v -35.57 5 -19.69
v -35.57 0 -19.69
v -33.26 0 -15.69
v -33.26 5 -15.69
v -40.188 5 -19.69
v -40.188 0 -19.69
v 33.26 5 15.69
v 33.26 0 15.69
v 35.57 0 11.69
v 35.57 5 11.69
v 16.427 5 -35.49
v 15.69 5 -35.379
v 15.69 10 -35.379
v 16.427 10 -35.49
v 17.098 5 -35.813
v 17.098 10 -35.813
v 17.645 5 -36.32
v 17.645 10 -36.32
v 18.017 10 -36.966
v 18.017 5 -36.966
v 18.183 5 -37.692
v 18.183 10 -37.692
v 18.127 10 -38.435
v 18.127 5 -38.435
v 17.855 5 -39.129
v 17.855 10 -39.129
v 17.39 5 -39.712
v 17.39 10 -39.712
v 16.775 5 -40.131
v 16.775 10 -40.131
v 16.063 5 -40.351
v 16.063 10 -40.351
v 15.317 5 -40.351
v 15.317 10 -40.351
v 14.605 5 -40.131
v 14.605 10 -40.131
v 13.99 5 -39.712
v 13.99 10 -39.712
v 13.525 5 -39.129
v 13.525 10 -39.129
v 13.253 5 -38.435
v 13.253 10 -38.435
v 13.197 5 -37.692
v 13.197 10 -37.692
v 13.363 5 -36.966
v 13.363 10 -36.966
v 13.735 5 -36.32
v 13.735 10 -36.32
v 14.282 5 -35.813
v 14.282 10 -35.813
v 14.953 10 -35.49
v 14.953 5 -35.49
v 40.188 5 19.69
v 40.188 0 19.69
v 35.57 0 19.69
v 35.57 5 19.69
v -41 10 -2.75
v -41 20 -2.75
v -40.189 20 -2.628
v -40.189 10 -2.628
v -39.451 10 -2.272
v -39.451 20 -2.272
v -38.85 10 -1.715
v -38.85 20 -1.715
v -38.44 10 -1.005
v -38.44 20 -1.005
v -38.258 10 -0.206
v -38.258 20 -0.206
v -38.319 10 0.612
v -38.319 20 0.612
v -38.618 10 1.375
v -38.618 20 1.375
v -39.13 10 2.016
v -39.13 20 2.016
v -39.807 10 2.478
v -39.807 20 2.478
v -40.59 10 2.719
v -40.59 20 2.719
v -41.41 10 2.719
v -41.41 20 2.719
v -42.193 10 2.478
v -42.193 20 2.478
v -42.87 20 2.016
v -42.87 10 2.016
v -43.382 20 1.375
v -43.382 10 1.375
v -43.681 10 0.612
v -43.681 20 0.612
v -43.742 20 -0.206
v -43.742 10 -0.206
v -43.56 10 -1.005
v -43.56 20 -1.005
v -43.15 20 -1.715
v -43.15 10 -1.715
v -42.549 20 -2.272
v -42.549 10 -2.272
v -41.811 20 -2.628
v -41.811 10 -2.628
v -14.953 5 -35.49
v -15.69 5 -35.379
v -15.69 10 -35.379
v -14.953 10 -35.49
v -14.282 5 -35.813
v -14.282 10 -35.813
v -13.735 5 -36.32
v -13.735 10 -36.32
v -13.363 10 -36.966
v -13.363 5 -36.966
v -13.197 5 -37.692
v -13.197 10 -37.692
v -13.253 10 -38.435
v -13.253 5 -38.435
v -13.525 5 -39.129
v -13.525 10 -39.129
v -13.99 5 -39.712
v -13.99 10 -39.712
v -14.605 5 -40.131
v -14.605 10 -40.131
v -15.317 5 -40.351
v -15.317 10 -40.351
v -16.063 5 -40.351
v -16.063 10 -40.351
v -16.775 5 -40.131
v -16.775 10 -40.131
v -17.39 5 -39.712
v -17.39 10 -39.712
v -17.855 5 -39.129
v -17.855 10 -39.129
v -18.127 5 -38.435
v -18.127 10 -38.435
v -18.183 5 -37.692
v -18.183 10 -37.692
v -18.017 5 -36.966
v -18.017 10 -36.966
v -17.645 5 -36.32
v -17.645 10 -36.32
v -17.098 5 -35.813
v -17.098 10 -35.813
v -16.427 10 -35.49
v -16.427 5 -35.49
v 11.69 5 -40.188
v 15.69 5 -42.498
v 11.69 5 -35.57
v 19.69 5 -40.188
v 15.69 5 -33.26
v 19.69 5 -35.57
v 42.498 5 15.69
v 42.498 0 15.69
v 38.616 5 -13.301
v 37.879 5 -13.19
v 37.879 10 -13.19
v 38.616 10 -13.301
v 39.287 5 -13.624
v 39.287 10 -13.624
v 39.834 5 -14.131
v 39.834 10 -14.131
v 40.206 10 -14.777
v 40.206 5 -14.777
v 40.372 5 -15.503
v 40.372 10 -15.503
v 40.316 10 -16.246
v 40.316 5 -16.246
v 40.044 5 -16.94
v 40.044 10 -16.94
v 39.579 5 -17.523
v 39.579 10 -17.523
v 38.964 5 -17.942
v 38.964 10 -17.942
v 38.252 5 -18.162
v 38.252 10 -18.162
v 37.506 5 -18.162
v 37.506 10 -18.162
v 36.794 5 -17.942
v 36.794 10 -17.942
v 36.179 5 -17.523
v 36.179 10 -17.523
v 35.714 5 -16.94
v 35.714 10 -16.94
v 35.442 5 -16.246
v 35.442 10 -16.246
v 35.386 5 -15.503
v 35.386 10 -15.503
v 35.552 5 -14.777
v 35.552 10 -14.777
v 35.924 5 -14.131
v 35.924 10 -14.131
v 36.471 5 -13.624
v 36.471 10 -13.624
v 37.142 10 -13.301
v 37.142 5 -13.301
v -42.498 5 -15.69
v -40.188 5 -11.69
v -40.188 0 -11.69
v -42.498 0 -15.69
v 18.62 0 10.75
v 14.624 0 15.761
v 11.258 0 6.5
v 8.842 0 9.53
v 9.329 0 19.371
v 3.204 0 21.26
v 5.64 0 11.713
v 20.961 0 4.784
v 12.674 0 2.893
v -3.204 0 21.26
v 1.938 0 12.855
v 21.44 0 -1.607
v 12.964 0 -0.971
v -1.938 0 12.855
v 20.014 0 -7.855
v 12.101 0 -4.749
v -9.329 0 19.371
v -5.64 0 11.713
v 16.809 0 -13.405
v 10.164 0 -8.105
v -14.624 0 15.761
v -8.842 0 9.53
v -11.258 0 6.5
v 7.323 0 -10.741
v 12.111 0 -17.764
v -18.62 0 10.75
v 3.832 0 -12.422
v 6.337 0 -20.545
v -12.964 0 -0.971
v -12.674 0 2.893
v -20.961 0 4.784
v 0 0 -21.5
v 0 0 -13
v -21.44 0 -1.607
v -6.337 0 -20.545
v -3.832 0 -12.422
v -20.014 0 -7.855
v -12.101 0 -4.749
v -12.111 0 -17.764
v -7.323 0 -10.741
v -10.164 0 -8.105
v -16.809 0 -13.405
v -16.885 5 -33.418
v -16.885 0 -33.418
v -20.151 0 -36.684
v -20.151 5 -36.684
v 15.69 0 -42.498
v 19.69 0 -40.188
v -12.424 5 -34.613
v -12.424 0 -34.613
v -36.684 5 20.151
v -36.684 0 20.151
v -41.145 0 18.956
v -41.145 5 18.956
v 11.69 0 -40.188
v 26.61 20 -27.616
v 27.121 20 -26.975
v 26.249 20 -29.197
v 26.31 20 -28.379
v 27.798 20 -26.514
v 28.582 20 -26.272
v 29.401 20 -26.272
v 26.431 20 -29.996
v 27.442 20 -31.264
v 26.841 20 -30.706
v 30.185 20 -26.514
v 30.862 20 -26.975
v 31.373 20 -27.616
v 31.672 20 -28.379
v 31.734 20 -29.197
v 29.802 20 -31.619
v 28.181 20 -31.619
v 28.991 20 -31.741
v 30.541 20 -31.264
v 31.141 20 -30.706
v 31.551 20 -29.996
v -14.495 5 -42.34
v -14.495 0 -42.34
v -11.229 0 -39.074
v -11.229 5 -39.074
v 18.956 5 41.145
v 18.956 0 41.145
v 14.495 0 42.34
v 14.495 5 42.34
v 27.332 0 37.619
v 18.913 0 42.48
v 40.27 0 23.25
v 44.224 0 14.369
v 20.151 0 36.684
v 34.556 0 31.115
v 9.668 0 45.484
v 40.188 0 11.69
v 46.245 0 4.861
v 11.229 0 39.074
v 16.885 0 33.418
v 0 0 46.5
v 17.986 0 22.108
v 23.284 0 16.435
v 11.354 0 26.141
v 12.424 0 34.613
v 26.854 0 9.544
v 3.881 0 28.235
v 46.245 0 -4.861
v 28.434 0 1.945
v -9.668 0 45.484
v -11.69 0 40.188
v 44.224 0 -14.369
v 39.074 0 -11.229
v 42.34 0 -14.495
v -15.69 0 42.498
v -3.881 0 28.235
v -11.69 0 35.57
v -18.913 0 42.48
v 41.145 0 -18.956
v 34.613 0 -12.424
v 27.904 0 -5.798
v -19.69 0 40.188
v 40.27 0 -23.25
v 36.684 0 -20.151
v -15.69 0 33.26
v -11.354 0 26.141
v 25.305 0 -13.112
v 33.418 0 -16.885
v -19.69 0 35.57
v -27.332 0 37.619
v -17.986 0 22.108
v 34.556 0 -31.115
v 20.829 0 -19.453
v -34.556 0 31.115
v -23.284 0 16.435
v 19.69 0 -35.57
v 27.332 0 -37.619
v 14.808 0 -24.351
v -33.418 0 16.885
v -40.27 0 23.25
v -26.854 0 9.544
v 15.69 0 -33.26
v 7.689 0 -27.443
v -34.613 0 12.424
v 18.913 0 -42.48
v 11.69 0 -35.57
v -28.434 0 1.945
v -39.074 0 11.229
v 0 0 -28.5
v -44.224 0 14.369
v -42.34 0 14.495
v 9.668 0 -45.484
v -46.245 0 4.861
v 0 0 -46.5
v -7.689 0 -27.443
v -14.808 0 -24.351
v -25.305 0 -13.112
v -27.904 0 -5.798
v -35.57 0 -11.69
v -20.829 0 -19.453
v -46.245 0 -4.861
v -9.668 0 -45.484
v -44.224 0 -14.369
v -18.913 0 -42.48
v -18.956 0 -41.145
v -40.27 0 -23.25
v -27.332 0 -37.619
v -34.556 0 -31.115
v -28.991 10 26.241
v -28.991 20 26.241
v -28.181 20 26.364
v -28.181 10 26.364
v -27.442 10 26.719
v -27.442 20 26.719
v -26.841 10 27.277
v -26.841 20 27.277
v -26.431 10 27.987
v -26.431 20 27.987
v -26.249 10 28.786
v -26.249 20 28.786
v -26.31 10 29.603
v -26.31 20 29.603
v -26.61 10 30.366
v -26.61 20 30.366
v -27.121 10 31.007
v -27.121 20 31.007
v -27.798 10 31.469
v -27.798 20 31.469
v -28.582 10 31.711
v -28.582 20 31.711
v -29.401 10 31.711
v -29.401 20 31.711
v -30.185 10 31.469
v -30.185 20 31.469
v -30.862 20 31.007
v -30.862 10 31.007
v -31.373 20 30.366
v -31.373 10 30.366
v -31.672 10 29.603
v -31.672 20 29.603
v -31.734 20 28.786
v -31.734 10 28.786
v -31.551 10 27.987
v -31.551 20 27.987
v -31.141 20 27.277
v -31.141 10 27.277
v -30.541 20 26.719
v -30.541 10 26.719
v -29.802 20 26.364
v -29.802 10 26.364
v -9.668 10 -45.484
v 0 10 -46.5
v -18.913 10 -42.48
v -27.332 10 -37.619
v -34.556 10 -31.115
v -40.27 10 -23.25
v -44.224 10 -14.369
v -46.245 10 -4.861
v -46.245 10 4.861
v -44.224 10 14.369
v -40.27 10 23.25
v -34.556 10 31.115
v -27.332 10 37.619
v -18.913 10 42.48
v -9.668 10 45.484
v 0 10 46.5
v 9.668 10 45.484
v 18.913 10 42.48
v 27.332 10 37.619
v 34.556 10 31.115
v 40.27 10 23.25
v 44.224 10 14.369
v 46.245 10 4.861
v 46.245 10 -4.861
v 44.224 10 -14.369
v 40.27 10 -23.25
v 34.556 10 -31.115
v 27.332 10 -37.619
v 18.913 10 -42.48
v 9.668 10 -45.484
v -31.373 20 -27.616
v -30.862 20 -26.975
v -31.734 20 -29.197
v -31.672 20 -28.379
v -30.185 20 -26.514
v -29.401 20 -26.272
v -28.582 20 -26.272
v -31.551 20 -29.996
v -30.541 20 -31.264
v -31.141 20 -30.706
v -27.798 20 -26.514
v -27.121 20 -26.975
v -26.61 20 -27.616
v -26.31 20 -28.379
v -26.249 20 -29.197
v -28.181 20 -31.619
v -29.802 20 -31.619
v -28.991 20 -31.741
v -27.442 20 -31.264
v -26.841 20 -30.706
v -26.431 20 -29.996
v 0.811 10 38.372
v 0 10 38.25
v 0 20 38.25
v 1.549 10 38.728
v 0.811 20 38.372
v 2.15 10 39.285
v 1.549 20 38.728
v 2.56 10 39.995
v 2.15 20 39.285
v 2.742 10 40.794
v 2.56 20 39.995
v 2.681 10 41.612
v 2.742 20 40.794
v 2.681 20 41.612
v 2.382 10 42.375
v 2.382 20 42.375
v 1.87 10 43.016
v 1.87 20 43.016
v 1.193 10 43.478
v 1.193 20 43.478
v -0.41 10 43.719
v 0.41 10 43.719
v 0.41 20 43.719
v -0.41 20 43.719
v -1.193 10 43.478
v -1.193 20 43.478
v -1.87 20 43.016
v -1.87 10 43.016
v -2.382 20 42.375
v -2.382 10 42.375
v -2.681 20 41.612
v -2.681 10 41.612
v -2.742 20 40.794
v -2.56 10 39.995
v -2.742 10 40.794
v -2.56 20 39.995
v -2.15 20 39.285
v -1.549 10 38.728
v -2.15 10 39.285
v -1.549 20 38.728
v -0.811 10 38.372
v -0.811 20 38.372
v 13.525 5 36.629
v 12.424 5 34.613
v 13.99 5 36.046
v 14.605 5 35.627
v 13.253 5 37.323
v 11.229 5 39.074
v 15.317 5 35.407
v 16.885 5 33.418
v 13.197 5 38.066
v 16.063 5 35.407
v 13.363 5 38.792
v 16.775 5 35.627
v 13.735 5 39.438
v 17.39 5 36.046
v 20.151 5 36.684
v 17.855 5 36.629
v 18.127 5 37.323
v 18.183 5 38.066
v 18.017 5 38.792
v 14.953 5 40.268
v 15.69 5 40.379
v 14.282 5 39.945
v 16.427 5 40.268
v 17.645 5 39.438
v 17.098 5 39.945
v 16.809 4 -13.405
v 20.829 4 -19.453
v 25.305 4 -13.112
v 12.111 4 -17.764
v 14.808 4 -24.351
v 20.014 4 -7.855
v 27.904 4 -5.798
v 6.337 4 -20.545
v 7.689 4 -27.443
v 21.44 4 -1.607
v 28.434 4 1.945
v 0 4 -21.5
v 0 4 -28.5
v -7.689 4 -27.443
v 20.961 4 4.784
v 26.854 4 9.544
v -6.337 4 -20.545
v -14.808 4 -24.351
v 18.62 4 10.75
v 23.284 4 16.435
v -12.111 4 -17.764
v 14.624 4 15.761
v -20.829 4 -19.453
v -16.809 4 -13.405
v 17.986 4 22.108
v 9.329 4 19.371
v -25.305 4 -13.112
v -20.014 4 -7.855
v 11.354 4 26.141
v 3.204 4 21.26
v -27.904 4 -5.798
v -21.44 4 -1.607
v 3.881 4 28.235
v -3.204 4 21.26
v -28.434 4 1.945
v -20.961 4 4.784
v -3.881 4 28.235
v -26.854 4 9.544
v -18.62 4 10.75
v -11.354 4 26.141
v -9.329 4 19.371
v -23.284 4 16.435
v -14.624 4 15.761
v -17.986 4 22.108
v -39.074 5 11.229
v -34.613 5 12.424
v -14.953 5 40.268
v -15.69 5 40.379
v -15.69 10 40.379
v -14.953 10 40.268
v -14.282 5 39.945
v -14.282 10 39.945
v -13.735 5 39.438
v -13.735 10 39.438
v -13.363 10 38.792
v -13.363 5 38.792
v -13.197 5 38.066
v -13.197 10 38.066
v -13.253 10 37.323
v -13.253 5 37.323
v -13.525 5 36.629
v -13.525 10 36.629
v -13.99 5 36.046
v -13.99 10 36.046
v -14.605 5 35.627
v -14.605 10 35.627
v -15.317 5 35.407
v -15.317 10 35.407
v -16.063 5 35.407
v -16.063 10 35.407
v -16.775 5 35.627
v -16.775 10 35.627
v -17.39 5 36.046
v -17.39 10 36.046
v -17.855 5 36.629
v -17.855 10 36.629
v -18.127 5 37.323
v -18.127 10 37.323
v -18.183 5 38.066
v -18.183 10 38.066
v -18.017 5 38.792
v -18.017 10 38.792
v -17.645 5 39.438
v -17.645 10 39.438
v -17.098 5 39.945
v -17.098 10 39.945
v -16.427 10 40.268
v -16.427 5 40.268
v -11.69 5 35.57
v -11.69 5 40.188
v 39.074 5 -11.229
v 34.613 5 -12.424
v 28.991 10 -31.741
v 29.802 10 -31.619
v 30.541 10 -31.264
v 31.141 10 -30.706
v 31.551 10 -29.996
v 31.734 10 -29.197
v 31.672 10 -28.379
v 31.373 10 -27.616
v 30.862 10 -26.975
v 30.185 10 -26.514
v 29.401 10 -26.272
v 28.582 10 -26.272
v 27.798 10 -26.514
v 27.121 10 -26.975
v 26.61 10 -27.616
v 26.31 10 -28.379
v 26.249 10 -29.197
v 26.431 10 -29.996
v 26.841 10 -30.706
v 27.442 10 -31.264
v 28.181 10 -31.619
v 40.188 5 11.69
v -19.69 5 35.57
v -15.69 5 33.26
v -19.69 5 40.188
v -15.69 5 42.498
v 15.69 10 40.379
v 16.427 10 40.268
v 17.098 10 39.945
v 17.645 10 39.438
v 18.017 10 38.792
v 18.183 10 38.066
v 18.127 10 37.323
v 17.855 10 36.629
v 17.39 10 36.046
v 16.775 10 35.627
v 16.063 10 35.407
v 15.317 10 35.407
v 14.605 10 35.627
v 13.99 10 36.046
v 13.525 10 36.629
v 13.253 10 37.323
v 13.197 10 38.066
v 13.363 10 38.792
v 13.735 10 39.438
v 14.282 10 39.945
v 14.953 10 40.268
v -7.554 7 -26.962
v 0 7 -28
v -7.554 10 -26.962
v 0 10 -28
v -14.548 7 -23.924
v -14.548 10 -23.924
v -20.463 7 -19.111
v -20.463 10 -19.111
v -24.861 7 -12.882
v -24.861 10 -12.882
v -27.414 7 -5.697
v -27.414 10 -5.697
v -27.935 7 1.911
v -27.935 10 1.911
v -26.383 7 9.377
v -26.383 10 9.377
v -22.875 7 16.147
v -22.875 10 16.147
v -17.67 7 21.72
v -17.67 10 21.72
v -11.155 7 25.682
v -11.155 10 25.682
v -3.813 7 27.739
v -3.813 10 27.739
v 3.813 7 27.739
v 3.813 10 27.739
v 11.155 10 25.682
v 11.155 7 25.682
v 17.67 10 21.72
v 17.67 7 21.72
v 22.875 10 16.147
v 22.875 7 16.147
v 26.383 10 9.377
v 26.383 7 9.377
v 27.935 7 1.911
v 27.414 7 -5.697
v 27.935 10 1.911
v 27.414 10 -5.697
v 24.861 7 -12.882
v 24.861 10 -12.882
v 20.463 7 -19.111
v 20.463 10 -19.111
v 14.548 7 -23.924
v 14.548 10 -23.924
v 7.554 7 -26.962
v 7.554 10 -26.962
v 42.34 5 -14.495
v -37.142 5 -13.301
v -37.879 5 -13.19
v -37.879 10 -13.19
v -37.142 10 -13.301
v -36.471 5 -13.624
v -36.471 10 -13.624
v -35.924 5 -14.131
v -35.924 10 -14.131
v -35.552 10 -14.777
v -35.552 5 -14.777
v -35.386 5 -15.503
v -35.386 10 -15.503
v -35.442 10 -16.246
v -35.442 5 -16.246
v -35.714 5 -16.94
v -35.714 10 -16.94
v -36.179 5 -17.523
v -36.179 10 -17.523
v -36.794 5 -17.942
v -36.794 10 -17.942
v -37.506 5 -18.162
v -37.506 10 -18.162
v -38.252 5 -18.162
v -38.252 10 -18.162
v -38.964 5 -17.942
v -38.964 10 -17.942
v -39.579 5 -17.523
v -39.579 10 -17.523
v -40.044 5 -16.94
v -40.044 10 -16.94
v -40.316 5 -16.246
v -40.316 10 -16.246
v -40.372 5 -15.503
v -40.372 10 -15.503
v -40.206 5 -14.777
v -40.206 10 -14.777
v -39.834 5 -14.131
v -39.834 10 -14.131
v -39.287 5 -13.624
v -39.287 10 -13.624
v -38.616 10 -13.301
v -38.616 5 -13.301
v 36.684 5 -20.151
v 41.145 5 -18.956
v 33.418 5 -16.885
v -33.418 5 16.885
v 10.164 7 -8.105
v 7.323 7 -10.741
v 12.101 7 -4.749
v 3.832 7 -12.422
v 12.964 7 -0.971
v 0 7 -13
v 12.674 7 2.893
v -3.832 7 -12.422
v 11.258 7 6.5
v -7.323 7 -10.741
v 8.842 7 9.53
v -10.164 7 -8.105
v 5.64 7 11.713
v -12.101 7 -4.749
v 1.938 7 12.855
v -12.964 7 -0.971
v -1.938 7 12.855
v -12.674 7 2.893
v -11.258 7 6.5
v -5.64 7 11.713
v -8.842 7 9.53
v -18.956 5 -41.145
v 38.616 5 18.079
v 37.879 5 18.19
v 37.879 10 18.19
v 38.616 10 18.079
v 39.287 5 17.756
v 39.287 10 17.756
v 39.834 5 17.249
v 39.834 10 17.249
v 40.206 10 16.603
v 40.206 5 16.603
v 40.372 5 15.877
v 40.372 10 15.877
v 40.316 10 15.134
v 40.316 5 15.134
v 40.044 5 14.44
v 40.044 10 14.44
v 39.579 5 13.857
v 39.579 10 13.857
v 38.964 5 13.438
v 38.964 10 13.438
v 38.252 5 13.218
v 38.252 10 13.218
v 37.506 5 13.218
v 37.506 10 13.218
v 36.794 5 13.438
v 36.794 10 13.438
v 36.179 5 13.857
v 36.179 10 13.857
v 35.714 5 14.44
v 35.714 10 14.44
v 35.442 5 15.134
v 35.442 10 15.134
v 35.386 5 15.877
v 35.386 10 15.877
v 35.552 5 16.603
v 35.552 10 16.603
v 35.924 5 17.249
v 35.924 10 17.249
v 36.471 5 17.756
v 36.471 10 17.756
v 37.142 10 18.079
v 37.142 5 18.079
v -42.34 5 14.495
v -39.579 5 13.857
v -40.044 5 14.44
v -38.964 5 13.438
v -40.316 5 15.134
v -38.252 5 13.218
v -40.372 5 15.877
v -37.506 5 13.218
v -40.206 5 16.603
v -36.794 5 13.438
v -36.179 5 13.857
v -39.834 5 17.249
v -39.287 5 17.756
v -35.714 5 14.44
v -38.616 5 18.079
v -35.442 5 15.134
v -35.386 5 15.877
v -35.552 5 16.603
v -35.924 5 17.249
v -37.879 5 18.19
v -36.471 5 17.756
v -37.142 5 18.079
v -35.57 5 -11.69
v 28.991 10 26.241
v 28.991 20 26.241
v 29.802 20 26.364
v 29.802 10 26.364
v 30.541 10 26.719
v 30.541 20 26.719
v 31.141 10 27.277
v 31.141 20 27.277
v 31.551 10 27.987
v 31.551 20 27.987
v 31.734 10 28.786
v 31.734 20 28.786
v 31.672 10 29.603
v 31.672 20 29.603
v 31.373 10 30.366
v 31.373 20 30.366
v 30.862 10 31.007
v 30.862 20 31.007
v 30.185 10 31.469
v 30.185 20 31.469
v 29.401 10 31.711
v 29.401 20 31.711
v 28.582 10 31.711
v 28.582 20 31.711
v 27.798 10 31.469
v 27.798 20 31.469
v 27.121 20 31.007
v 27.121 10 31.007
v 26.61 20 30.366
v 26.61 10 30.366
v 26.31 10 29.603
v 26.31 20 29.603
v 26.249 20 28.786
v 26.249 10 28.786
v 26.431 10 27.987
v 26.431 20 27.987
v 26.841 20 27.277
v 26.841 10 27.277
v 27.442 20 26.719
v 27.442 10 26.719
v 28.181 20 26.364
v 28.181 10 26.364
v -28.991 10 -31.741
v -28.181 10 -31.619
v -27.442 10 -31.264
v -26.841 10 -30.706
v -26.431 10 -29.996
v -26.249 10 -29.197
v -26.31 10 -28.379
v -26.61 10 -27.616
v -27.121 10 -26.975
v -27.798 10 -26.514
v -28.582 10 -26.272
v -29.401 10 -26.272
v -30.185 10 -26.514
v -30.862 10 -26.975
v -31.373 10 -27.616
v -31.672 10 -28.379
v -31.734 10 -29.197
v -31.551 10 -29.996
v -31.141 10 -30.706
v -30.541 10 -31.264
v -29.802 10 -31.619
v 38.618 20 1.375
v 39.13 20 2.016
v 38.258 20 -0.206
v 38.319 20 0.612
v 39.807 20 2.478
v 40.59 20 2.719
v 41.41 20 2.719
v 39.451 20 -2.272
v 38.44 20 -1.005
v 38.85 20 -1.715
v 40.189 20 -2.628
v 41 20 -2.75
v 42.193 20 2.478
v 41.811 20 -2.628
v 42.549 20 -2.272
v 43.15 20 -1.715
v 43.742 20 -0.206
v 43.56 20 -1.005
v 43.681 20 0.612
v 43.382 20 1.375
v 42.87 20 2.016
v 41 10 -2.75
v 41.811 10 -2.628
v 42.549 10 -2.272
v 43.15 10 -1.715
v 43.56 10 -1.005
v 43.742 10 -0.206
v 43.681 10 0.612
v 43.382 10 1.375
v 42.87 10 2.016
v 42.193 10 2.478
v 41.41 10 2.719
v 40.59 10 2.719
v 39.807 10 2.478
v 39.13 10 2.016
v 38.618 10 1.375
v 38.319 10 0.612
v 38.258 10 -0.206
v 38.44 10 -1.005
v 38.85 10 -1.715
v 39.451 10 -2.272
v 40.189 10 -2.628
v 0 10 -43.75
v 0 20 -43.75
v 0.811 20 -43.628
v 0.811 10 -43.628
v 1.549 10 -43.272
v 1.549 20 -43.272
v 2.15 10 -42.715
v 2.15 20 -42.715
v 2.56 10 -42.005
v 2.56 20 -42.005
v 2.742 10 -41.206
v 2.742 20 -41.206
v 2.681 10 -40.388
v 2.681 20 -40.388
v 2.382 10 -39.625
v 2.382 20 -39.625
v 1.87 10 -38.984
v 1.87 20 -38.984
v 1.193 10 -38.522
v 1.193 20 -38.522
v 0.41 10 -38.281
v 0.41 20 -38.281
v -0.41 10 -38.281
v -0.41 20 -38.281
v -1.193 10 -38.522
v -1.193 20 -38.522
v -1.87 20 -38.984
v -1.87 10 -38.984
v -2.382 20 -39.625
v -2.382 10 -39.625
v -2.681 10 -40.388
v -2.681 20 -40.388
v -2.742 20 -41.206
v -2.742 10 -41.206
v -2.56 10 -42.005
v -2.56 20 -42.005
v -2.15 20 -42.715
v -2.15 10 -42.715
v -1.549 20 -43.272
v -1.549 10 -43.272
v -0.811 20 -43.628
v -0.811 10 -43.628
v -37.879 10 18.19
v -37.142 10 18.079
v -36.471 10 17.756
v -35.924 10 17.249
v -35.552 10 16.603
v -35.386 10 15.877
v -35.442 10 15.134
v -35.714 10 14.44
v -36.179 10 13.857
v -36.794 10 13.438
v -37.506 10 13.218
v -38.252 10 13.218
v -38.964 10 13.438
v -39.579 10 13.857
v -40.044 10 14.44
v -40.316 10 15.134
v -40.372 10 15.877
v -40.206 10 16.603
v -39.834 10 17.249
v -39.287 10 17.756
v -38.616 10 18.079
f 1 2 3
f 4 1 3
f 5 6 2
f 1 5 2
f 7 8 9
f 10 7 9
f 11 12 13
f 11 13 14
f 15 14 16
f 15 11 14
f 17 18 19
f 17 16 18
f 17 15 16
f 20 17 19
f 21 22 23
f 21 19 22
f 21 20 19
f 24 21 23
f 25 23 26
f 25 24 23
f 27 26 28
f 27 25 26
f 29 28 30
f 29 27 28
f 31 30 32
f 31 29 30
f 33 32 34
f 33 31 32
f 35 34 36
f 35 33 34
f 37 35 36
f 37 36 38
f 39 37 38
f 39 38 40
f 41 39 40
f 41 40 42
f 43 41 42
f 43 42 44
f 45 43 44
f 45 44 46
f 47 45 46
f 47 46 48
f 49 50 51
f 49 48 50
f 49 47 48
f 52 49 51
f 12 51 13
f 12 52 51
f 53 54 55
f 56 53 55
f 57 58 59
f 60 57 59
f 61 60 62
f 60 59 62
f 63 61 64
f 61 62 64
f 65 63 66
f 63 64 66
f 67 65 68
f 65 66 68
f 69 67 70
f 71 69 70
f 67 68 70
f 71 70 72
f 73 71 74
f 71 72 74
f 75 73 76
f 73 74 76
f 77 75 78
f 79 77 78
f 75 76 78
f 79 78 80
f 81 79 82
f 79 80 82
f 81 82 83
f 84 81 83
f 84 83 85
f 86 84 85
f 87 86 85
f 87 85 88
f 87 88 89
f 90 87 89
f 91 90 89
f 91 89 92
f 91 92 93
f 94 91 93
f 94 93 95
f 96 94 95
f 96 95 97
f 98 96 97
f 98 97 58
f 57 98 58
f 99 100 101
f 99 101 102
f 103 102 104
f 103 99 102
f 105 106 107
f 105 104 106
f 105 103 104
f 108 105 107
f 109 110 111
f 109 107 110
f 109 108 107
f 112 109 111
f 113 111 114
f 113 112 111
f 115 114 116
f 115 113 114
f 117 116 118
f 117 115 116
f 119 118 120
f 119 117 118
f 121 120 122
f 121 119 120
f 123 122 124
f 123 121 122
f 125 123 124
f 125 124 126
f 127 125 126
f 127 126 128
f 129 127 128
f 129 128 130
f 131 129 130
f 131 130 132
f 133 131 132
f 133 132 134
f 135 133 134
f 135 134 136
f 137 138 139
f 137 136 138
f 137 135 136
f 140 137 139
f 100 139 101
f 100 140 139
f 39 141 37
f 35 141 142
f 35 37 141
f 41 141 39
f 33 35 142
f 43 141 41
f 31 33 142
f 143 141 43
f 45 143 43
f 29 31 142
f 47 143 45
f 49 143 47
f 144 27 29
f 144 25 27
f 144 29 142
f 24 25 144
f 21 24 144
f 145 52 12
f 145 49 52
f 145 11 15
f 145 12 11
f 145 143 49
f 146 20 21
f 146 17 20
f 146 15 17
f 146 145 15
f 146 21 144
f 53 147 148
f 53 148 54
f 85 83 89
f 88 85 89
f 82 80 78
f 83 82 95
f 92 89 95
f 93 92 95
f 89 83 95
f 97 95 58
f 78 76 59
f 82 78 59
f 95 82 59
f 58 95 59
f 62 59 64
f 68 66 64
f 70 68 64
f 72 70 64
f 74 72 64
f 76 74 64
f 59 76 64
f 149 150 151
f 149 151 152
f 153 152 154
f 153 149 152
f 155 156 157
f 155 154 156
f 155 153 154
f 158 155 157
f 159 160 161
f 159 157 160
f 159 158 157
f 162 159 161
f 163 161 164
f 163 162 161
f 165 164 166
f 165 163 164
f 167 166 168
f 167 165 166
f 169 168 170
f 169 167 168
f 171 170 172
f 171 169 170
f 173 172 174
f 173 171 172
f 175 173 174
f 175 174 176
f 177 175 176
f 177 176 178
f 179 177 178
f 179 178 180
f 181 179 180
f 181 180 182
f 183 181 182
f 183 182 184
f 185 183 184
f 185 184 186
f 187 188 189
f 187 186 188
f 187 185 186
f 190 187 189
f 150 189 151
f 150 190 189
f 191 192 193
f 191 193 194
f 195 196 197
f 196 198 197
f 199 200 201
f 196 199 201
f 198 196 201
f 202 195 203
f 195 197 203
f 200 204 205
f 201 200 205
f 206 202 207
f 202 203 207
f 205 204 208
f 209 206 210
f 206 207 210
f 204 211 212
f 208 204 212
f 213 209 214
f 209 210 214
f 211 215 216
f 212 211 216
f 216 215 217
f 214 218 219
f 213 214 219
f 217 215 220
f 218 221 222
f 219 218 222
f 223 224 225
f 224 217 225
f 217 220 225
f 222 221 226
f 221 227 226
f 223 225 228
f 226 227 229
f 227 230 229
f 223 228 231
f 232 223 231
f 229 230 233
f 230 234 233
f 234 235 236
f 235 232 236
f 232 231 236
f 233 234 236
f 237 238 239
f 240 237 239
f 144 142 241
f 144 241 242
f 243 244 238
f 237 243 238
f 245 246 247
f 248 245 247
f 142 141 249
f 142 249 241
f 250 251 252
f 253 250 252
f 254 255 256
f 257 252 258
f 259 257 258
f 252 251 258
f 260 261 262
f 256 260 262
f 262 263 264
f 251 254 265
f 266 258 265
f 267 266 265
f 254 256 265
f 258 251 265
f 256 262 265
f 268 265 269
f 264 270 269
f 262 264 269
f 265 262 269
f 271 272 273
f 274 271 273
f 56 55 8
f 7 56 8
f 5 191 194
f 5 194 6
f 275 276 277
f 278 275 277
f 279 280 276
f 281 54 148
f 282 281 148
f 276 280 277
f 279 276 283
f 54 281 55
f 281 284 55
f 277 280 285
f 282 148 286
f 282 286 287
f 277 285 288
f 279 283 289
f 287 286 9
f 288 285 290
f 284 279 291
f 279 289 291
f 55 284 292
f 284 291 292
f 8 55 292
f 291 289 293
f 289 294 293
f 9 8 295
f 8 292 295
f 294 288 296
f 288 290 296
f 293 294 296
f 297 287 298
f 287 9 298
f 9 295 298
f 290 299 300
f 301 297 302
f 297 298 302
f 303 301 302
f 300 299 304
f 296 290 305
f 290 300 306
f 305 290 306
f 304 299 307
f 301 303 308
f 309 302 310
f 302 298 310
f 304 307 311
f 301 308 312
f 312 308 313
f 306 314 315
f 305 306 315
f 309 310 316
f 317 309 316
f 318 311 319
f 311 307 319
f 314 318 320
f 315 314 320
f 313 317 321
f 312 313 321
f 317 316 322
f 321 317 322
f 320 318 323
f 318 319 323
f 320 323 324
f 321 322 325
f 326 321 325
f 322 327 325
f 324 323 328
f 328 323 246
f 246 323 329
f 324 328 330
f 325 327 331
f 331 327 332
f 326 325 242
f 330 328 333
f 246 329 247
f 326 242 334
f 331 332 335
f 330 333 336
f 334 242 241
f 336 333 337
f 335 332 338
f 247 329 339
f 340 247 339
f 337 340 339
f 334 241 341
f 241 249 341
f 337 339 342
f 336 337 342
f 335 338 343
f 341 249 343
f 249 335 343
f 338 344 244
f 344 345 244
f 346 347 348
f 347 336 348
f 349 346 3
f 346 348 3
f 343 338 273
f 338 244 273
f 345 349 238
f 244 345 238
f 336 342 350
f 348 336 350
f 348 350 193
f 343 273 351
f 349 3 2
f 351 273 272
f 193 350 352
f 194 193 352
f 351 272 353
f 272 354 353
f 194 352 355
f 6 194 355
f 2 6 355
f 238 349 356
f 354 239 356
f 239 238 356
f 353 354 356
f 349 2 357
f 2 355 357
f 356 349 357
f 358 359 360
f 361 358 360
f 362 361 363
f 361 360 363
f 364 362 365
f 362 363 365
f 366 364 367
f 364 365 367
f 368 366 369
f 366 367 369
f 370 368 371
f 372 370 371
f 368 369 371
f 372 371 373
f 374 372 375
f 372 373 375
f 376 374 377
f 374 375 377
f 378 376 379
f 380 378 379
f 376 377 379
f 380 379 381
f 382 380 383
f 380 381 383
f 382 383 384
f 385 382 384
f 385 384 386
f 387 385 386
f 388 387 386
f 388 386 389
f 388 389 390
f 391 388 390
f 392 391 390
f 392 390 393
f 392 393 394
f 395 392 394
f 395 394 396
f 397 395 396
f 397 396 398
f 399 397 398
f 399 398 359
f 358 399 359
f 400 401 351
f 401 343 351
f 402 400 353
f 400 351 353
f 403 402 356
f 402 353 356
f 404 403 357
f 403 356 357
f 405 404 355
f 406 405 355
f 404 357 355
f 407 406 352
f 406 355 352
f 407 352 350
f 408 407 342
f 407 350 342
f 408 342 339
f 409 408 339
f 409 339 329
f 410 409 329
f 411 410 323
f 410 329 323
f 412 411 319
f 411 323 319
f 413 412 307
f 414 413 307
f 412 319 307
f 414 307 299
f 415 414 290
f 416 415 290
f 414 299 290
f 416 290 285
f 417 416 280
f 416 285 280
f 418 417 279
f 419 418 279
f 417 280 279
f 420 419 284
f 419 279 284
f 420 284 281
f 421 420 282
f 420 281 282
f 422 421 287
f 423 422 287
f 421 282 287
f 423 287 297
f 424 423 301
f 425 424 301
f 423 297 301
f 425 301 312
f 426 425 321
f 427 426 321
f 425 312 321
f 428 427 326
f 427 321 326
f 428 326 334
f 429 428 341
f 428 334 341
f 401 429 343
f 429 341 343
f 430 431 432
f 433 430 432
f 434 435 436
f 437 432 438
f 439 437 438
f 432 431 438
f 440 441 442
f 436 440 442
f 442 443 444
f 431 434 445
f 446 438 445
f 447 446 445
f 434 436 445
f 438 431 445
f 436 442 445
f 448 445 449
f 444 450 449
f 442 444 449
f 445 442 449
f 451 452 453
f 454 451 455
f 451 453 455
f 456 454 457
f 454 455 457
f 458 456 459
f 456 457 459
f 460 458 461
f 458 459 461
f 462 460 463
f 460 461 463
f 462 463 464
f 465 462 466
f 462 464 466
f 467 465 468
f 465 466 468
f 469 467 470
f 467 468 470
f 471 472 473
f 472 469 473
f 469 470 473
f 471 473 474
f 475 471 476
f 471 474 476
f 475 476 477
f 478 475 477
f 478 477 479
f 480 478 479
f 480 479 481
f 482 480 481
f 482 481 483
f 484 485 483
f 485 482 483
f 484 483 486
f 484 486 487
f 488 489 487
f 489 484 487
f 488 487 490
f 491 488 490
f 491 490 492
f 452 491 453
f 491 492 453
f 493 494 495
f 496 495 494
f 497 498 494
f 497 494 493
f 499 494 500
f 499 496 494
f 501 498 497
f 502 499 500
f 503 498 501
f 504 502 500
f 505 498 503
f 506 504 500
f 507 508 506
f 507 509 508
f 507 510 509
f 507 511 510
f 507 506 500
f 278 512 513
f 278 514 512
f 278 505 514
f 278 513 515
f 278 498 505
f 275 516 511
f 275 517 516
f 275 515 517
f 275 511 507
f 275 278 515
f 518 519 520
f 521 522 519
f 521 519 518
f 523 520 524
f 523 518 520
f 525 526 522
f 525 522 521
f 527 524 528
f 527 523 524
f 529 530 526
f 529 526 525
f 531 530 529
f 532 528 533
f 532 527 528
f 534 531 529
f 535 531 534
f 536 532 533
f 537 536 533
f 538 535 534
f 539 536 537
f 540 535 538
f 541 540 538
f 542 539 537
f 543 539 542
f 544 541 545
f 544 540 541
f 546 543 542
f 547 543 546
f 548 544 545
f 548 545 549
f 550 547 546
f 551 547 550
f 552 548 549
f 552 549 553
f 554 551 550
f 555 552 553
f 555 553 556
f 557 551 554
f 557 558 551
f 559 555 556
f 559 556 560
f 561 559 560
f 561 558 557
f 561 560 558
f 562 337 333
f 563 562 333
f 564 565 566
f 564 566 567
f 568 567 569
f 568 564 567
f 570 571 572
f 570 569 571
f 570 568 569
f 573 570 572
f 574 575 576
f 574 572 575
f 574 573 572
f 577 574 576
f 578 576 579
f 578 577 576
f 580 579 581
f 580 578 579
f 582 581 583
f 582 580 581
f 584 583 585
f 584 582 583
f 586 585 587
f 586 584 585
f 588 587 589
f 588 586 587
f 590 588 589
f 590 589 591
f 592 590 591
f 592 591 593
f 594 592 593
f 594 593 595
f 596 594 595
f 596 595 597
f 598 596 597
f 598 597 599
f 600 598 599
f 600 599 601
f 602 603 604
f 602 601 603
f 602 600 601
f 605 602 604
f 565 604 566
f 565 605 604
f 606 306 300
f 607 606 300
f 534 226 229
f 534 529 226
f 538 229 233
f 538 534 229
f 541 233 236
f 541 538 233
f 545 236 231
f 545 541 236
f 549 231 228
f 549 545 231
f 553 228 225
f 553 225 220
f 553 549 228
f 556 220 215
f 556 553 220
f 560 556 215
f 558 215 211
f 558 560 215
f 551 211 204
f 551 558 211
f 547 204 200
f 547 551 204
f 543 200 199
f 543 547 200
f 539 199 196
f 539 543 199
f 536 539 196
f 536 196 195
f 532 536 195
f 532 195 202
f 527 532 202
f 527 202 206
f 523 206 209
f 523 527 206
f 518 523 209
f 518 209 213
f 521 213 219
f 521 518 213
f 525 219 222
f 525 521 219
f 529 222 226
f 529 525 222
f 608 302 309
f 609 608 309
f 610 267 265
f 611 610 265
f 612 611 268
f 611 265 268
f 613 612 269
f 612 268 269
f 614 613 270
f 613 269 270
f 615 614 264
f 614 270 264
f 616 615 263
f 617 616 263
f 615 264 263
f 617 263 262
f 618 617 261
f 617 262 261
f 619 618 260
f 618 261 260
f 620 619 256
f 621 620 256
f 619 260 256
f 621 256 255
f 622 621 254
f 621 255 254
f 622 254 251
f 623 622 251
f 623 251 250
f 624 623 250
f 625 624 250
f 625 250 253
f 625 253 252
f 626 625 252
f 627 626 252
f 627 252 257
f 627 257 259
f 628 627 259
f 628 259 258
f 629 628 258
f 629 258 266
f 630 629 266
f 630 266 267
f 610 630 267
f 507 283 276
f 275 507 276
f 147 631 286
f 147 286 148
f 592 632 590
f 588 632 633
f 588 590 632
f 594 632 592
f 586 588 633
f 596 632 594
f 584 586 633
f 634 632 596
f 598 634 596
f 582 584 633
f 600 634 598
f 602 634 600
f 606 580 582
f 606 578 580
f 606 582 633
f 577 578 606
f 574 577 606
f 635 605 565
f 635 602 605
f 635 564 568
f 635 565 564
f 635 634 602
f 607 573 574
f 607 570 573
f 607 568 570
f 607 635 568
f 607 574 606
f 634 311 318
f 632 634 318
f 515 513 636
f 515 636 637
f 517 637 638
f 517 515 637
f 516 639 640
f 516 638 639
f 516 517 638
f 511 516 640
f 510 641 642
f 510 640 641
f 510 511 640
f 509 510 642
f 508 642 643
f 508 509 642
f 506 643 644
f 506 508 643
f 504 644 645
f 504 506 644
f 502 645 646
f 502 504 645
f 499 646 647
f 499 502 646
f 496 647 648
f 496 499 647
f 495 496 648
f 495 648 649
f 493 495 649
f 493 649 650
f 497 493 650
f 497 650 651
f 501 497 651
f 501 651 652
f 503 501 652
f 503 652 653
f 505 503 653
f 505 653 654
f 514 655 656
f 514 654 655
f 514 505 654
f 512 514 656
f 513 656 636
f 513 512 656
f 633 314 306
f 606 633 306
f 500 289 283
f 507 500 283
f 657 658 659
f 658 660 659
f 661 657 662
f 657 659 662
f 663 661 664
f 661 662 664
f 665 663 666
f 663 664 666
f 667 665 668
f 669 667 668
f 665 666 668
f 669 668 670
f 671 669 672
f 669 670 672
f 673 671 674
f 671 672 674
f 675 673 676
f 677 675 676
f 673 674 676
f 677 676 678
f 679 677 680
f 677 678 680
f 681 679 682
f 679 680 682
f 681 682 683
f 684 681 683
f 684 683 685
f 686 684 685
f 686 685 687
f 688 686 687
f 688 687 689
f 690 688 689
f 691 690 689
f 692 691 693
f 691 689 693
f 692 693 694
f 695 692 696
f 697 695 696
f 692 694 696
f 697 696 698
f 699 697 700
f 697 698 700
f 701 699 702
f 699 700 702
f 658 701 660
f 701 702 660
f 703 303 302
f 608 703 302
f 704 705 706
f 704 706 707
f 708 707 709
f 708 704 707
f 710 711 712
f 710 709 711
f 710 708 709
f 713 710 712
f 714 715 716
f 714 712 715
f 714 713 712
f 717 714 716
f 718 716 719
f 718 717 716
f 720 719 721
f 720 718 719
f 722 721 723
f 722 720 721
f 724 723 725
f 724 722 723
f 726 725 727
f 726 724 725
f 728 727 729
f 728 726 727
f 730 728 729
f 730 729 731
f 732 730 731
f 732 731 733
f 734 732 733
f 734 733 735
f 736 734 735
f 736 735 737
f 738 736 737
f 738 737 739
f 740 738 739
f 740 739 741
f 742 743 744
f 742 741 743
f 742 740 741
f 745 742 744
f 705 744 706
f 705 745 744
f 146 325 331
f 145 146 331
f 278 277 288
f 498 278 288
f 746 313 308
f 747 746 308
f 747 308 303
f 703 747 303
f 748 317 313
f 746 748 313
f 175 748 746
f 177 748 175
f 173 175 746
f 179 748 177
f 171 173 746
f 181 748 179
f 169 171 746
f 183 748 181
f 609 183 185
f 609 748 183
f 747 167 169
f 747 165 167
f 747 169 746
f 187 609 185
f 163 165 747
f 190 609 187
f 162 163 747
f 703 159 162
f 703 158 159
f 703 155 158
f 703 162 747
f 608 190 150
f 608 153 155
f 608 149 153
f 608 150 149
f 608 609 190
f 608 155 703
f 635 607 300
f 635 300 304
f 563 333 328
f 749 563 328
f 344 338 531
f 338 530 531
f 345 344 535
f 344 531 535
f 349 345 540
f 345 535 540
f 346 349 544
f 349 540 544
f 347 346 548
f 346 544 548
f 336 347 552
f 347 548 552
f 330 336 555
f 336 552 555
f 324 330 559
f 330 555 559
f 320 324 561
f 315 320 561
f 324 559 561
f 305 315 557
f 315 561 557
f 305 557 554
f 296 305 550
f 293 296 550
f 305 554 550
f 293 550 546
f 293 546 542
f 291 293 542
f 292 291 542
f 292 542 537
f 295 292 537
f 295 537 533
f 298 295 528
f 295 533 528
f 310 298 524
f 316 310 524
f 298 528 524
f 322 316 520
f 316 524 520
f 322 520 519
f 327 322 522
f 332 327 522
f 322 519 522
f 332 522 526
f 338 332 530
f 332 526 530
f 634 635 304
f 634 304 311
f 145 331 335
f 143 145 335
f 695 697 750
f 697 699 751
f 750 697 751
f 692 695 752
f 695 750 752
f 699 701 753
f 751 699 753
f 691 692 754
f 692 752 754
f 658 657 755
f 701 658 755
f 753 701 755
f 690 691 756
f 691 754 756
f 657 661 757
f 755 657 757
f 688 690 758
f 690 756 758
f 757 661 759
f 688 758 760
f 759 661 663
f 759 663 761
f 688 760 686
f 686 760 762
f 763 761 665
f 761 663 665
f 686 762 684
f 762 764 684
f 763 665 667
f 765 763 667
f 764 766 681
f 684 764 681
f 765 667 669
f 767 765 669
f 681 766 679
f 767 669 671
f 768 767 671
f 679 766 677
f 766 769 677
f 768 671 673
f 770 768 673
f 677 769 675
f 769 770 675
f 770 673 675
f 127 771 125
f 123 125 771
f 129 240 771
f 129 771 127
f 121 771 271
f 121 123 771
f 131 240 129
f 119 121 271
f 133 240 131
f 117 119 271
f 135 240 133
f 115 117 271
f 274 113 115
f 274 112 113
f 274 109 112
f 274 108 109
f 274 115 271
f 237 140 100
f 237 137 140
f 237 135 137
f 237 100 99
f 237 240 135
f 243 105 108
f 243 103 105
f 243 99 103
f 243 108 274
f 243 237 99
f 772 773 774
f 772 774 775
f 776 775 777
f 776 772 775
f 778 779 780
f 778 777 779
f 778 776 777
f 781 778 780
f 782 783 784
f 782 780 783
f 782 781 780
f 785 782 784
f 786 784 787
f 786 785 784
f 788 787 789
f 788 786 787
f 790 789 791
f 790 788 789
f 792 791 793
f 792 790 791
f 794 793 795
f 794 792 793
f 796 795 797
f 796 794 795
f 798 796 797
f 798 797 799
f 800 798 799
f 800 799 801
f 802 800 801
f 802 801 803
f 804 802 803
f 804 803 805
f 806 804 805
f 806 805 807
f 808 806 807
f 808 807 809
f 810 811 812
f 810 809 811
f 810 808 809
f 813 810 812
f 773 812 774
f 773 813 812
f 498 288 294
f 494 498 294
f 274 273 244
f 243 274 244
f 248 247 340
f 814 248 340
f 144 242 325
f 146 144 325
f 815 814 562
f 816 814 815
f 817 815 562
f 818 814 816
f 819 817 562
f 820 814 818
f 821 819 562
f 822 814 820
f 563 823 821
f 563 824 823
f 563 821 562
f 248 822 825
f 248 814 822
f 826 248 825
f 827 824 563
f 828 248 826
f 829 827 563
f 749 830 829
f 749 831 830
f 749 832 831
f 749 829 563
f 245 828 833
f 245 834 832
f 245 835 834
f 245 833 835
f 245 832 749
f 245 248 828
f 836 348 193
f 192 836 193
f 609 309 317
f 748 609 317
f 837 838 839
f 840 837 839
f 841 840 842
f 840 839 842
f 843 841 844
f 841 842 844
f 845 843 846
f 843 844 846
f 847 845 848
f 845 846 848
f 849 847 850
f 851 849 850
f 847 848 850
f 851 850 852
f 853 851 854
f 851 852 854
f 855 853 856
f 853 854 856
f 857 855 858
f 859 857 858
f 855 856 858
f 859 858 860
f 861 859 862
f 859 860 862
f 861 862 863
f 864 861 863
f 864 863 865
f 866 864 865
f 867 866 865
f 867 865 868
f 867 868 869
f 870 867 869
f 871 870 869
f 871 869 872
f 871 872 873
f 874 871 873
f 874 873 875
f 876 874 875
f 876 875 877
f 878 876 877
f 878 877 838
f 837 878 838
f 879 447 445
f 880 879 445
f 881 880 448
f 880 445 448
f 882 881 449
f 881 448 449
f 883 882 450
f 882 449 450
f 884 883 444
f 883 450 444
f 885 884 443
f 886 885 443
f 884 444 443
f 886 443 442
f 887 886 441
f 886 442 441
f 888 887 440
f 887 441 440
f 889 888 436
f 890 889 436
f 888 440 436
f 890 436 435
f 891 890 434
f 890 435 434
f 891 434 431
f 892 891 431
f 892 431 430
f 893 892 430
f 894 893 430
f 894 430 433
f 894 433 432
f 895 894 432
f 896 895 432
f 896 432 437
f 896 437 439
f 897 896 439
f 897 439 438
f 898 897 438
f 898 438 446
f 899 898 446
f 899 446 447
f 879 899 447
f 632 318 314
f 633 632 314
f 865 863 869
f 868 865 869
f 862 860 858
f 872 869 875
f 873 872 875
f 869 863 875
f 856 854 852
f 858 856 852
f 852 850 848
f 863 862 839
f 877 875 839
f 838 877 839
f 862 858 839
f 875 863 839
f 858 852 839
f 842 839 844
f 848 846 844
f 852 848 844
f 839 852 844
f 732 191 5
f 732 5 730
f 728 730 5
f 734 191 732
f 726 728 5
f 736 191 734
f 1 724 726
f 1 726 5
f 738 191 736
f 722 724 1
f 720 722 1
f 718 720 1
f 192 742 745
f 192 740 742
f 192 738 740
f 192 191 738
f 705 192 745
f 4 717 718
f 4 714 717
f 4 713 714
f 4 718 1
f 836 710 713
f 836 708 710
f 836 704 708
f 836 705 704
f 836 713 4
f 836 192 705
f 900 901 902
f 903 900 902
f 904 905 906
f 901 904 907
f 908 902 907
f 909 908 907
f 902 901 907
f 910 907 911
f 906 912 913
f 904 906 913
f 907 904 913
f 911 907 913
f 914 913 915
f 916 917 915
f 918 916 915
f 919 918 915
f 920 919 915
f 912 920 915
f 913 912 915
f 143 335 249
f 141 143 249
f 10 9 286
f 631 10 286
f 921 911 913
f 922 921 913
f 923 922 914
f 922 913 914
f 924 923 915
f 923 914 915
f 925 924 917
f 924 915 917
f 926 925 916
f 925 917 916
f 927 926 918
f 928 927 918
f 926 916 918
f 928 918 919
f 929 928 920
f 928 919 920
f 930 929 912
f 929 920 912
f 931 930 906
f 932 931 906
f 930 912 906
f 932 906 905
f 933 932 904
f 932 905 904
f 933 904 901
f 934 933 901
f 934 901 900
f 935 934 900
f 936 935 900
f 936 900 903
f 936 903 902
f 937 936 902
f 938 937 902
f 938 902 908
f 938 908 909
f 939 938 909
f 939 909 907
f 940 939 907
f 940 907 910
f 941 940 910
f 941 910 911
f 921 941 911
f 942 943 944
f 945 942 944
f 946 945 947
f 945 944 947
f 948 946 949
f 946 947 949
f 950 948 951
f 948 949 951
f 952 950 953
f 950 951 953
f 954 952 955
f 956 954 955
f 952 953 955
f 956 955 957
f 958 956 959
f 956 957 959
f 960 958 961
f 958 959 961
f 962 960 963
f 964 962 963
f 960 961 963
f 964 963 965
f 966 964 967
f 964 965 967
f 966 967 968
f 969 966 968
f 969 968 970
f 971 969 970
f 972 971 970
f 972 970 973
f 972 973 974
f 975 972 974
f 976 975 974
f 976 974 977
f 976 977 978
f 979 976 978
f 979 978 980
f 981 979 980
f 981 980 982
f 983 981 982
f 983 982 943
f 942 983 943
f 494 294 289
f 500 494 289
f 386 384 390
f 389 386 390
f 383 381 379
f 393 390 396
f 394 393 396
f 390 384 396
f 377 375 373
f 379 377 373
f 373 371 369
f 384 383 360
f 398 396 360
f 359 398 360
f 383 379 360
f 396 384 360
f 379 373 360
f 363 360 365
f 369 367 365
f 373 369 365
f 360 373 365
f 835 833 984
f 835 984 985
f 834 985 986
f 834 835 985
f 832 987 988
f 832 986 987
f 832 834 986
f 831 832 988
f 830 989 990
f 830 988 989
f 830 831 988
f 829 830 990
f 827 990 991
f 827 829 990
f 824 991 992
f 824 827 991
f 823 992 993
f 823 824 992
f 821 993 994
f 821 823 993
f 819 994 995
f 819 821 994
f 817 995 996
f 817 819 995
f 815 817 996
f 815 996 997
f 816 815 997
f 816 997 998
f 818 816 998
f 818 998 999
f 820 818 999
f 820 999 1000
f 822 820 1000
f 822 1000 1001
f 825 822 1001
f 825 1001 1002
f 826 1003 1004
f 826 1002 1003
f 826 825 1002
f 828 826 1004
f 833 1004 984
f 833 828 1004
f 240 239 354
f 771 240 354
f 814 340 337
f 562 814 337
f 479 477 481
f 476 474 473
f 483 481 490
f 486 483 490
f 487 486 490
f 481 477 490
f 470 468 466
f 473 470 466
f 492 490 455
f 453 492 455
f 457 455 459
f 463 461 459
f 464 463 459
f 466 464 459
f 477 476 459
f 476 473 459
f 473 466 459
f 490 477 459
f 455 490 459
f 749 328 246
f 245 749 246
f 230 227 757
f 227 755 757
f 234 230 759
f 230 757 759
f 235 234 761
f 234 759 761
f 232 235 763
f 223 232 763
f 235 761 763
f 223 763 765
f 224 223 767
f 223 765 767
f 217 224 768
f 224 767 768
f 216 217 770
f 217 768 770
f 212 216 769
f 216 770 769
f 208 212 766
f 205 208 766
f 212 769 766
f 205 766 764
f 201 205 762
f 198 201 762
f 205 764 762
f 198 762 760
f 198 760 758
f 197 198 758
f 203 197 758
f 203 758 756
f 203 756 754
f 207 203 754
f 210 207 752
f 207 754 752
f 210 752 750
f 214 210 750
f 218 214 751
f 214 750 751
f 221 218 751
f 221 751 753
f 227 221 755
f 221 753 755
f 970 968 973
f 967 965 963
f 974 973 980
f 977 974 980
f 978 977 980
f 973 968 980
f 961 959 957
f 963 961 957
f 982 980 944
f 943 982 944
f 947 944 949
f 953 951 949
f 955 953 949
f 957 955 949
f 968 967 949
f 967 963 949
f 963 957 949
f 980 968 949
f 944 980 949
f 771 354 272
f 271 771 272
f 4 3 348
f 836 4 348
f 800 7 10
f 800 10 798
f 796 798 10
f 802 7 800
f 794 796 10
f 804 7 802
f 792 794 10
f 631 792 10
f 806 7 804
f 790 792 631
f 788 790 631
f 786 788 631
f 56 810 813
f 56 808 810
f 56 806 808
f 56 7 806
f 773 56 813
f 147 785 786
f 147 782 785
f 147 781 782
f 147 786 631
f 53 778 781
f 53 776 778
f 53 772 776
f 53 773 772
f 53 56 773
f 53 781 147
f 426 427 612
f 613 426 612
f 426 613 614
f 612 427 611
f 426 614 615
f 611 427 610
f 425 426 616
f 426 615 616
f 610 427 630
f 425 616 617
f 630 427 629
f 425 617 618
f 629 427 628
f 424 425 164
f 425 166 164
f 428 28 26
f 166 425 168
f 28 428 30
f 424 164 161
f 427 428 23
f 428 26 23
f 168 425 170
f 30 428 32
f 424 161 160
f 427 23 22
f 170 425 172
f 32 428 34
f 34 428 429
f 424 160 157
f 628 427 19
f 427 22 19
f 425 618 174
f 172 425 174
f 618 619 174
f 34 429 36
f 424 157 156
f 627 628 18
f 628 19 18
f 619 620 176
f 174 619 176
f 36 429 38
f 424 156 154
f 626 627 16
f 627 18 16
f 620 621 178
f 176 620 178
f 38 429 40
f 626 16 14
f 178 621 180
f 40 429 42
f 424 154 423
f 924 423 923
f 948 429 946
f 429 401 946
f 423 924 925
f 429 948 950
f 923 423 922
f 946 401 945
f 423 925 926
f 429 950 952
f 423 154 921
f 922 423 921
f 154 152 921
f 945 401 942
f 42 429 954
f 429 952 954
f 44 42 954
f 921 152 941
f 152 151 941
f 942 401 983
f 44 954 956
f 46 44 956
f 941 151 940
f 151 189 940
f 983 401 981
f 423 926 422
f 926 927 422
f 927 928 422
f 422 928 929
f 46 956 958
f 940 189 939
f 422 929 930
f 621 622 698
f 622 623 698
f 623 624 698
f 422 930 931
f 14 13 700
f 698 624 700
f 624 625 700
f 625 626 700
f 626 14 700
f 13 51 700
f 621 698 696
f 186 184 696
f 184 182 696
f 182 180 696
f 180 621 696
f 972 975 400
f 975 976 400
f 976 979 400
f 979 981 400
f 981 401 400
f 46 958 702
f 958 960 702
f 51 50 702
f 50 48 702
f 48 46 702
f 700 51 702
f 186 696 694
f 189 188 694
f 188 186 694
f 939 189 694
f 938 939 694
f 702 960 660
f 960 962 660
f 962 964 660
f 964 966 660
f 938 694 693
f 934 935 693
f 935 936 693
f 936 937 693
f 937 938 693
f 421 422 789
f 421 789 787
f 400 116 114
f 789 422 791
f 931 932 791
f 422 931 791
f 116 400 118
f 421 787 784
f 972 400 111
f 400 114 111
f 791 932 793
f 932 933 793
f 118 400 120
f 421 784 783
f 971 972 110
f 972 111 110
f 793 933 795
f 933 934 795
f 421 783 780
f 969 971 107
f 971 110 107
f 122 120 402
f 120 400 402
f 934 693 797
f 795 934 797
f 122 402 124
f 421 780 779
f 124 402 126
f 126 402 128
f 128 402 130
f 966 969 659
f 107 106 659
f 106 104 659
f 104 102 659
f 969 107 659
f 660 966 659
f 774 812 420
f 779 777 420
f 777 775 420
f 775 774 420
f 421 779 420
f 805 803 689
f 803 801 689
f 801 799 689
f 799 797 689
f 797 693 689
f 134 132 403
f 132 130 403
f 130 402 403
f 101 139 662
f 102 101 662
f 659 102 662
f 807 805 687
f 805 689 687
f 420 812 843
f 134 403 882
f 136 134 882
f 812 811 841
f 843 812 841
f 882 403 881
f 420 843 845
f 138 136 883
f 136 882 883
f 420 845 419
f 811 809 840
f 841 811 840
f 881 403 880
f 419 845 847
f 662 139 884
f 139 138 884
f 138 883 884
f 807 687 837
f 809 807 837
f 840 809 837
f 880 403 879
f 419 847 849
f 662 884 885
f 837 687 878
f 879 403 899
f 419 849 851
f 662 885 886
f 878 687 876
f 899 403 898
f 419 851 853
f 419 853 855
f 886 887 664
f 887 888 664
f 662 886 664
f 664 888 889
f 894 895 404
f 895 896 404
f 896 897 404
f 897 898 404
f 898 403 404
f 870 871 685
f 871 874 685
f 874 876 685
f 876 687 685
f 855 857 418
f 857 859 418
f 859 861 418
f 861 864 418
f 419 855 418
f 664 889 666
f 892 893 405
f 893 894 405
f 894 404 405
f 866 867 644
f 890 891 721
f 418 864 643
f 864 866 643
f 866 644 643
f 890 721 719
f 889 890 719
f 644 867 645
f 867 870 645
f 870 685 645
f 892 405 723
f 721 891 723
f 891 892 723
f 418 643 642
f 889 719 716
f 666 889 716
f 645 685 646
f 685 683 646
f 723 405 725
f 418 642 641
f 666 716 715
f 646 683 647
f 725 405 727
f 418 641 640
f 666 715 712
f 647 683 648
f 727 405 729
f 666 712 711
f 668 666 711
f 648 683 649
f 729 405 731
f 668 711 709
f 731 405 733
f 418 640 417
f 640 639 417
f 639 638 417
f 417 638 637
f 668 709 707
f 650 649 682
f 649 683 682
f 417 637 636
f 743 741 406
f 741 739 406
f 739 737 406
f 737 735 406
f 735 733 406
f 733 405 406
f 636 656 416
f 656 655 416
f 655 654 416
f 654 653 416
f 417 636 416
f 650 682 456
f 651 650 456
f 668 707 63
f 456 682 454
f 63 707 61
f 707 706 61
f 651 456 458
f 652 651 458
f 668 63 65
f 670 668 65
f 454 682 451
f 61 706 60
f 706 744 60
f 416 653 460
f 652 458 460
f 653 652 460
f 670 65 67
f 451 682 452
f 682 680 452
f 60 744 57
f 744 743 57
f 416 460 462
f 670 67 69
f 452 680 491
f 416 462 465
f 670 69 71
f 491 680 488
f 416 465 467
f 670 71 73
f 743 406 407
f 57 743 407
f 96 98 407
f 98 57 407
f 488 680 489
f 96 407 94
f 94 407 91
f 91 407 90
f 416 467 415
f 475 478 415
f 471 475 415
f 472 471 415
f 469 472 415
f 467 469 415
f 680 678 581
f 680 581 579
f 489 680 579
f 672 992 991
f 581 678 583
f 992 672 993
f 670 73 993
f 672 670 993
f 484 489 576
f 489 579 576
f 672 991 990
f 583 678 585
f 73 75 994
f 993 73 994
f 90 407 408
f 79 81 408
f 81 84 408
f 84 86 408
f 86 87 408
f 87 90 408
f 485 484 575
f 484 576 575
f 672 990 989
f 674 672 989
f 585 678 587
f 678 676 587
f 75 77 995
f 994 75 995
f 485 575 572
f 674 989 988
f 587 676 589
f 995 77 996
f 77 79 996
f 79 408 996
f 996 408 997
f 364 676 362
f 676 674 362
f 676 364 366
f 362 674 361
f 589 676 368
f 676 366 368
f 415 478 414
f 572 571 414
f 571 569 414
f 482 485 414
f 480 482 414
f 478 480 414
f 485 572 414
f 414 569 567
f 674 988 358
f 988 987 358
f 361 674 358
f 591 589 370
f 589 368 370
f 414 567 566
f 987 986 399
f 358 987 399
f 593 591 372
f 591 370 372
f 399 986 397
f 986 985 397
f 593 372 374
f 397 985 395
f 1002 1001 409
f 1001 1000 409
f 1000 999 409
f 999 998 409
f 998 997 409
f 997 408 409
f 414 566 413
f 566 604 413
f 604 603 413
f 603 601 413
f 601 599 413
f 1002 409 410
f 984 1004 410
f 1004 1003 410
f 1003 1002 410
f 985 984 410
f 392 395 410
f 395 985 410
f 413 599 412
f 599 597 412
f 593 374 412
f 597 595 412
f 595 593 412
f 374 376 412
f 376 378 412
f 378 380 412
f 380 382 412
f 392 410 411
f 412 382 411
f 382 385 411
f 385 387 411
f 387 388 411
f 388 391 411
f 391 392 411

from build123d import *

# Parameters (mm, degrees)
CUT_EXTRUDE1_DEPTH      = 67.516915142
CUT_EXTRUDE1_DEPTH_BACK = 67.516915142
SKETCH2_R               = 2.75
SKETCH2_R_2             = 2.5
SKETCH3_W               = 7
SKETCH3_H               = 4
CUT_EXTRUDE2_DEPTH      = 5
BOSS_EXTRUDE1_START     = -20
SKETCH5_R               = 2.75
BOSS_EXTRUDE1_DEPTH     = 20


with BuildPart() as part:
    # Sketch1 → Revolve1 (revolve)
    with BuildSketch(Plane.XY, mode=Mode.PRIVATE) as revolve1_sk:
        Polygon((-28, 10), (-46.5, 10), (-46.5, 0), (-13, 0), (-13, 7), (-28, 7), align=None)
    revolve(revolve1_sk.sketch.rotate(Axis((0, -1.751877994, 0), (0, 1, 0)), 270), axis=Axis((0, -1.751877994, 0), (0, 1, 0)))

    # Sketch2 → Cut-Extrude1 (cut, two sides: drawn at the far end of the back side and taken through both)
    with BuildSketch(Plane(origin=(0, 10, 0), x_dir=(1, 0, 0), z_dir=(0, 1, 0)).offset(-CUT_EXTRUDE1_DEPTH_BACK)):
        with Locations(Location((0, 41, 0), (0, 0, 270))):
            Circle(SKETCH2_R)
        with Locations(Location((15.690020727, 37.879060833, 0), (0, 0, 270))):
            Circle(SKETCH2_R_2)
        with Locations(Location((28.991378029, 28.991378029, 0), (0, 0, 270))):
            Circle(SKETCH2_R)
        with Locations(Location((37.879060833, 15.690020727, 0), (0, 0, 270))):
            Circle(SKETCH2_R_2)
        with Locations(Location((41, 0, 0), (0, 0, 270))):
            Circle(SKETCH2_R)
        with Locations(Location((37.879060833, -15.690020727, 0), (0, 0, 270))):
            Circle(SKETCH2_R_2)
        with Locations(Location((28.991378029, -28.991378029, 0), (0, 0, 270))):
            Circle(SKETCH2_R)
        with Locations(Location((15.690020727, -37.879060833, 0), (0, 0, 270))):
            Circle(SKETCH2_R_2)
        with Locations(Location((0, -41, 0), (0, 0, 270))):
            Circle(SKETCH2_R)
        with Locations(Location((-15.690020727, -37.879060833, 0), (0, 0, 270))):
            Circle(SKETCH2_R_2)
        with Locations(Location((-28.991378029, -28.991378029, 0), (0, 0, 270))):
            Circle(SKETCH2_R)
        with Locations(Location((-37.879060833, -15.690020727, 0), (0, 0, 270))):
            Circle(SKETCH2_R_2)
        with Locations(Location((-41, 0, 0), (0, 0, 270))):
            Circle(SKETCH2_R)
        with Locations(Location((-37.879060833, 15.690020727, 0), (0, 0, 270))):
            Circle(SKETCH2_R_2)
        with Locations(Location((-28.991378029, 28.991378029, 0), (0, 0, 270))):
            Circle(SKETCH2_R)
        with Locations(Location((-15.690020727, 37.879060833, 0), (0, 0, 270))):
            Circle(SKETCH2_R_2)
    extrude(amount=CUT_EXTRUDE1_DEPTH + CUT_EXTRUDE1_DEPTH_BACK, mode=Mode.SUBTRACT)

    # Sketch3 → Cut-Revolve1 (revolve, cut)
    with BuildSketch(Plane.XY, mode=Mode.PRIVATE) as cut_revolve1_sk:
        with Locations((25, 2)):
            Rectangle(SKETCH3_W, SKETCH3_H)
    revolve(cut_revolve1_sk.sketch.rotate(Axis((0, -19.065406541, 0), (0, 1, 0)), 90), axis=Axis((0, -19.065406541, 0), (0, 1, 0)), mode=Mode.SUBTRACT)

    # Sketch4 → Cut-Extrude2 (cut)
    with BuildSketch(Plane.XZ):
        Polygon((-19.690020727, 40.18846191), (-19.690020727, 35.569659756), (-15.690020727, 33.260258679), (-11.690020727, 35.569659756), (-11.690020727, 40.18846191), (-15.690020727, 42.497862986), align=None)
        Polygon((18.956007051, 41.145047157), (14.494586764, 42.34048112), (11.22860044, 39.074494796), (12.424034403, 34.613074509), (16.88545469, 33.417640546), (20.151441014, 36.68362687), align=None)
        Polygon((42.497862986, 15.690020727), (40.18846191, 19.690020727), (35.569659756, 19.690020727), (33.260258679, 15.690020727), (35.569659756, 11.690020727), (40.18846191, 11.690020727), align=None)
        Polygon((41.145047157, -18.956007051), (42.34048112, -14.494586764), (39.074494796, -11.22860044), (34.613074509, -12.424034403), (33.417640546, -16.88545469), (36.68362687, -20.151441014), align=None)
        Polygon((15.690020727, -42.497862986), (19.690020727, -40.18846191), (19.690020727, -35.569659756), (15.690020727, -33.260258679), (11.690020727, -35.569659756), (11.690020727, -40.18846191), align=None)
        Polygon((-18.956007051, -41.145047157), (-14.494586764, -42.34048112), (-11.22860044, -39.074494796), (-12.424034403, -34.613074509), (-16.88545469, -33.417640546), (-20.151441014, -36.68362687), align=None)
        Polygon((-42.497862986, -15.690020727), (-40.18846191, -19.690020727), (-35.569659756, -19.690020727), (-33.260258679, -15.690020727), (-35.569659756, -11.690020727), (-40.18846191, -11.690020727), align=None)
        Polygon((-41.145047157, 18.956007051), (-42.34048112, 14.494586764), (-39.074494796, 11.22860044), (-34.613074509, 12.424034403), (-33.417640546, 16.88545469), (-36.68362687, 20.151441014), align=None)
    extrude(amount=-CUT_EXTRUDE2_DEPTH, mode=Mode.SUBTRACT)

    # Sketch5 → Boss-Extrude1 (add)
    with BuildSketch(Plane.XZ.offset(BOSS_EXTRUDE1_START)):
        with Locations(Location((0, 41, 0), (0, 0, 270))):
            Circle(SKETCH5_R)
        with Locations(Location((28.991378029, 28.991378029, 0), (0, 0, 270))):
            Circle(SKETCH5_R)
        with Locations(Location((41, 0, 0), (0, 0, 270))):
            Circle(SKETCH5_R)
        with Locations(Location((28.991378029, -28.991378029, 0), (0, 0, 270))):
            Circle(SKETCH5_R)
        with Locations(Location((0, -41, 0), (0, 0, 270))):
            Circle(SKETCH5_R)
        with Locations(Location((-28.991378029, -28.991378029, 0), (0, 0, 270))):
            Circle(SKETCH5_R)
        with Locations(Location((-41, 0, 0), (0, 0, 270))):
            Circle(SKETCH5_R)
        with Locations(Location((-28.991378029, 28.991378029, 0), (0, 0, 270))):
            Circle(SKETCH5_R)
    extrude(amount=BOSS_EXTRUDE1_DEPTH)


solid = part.part
